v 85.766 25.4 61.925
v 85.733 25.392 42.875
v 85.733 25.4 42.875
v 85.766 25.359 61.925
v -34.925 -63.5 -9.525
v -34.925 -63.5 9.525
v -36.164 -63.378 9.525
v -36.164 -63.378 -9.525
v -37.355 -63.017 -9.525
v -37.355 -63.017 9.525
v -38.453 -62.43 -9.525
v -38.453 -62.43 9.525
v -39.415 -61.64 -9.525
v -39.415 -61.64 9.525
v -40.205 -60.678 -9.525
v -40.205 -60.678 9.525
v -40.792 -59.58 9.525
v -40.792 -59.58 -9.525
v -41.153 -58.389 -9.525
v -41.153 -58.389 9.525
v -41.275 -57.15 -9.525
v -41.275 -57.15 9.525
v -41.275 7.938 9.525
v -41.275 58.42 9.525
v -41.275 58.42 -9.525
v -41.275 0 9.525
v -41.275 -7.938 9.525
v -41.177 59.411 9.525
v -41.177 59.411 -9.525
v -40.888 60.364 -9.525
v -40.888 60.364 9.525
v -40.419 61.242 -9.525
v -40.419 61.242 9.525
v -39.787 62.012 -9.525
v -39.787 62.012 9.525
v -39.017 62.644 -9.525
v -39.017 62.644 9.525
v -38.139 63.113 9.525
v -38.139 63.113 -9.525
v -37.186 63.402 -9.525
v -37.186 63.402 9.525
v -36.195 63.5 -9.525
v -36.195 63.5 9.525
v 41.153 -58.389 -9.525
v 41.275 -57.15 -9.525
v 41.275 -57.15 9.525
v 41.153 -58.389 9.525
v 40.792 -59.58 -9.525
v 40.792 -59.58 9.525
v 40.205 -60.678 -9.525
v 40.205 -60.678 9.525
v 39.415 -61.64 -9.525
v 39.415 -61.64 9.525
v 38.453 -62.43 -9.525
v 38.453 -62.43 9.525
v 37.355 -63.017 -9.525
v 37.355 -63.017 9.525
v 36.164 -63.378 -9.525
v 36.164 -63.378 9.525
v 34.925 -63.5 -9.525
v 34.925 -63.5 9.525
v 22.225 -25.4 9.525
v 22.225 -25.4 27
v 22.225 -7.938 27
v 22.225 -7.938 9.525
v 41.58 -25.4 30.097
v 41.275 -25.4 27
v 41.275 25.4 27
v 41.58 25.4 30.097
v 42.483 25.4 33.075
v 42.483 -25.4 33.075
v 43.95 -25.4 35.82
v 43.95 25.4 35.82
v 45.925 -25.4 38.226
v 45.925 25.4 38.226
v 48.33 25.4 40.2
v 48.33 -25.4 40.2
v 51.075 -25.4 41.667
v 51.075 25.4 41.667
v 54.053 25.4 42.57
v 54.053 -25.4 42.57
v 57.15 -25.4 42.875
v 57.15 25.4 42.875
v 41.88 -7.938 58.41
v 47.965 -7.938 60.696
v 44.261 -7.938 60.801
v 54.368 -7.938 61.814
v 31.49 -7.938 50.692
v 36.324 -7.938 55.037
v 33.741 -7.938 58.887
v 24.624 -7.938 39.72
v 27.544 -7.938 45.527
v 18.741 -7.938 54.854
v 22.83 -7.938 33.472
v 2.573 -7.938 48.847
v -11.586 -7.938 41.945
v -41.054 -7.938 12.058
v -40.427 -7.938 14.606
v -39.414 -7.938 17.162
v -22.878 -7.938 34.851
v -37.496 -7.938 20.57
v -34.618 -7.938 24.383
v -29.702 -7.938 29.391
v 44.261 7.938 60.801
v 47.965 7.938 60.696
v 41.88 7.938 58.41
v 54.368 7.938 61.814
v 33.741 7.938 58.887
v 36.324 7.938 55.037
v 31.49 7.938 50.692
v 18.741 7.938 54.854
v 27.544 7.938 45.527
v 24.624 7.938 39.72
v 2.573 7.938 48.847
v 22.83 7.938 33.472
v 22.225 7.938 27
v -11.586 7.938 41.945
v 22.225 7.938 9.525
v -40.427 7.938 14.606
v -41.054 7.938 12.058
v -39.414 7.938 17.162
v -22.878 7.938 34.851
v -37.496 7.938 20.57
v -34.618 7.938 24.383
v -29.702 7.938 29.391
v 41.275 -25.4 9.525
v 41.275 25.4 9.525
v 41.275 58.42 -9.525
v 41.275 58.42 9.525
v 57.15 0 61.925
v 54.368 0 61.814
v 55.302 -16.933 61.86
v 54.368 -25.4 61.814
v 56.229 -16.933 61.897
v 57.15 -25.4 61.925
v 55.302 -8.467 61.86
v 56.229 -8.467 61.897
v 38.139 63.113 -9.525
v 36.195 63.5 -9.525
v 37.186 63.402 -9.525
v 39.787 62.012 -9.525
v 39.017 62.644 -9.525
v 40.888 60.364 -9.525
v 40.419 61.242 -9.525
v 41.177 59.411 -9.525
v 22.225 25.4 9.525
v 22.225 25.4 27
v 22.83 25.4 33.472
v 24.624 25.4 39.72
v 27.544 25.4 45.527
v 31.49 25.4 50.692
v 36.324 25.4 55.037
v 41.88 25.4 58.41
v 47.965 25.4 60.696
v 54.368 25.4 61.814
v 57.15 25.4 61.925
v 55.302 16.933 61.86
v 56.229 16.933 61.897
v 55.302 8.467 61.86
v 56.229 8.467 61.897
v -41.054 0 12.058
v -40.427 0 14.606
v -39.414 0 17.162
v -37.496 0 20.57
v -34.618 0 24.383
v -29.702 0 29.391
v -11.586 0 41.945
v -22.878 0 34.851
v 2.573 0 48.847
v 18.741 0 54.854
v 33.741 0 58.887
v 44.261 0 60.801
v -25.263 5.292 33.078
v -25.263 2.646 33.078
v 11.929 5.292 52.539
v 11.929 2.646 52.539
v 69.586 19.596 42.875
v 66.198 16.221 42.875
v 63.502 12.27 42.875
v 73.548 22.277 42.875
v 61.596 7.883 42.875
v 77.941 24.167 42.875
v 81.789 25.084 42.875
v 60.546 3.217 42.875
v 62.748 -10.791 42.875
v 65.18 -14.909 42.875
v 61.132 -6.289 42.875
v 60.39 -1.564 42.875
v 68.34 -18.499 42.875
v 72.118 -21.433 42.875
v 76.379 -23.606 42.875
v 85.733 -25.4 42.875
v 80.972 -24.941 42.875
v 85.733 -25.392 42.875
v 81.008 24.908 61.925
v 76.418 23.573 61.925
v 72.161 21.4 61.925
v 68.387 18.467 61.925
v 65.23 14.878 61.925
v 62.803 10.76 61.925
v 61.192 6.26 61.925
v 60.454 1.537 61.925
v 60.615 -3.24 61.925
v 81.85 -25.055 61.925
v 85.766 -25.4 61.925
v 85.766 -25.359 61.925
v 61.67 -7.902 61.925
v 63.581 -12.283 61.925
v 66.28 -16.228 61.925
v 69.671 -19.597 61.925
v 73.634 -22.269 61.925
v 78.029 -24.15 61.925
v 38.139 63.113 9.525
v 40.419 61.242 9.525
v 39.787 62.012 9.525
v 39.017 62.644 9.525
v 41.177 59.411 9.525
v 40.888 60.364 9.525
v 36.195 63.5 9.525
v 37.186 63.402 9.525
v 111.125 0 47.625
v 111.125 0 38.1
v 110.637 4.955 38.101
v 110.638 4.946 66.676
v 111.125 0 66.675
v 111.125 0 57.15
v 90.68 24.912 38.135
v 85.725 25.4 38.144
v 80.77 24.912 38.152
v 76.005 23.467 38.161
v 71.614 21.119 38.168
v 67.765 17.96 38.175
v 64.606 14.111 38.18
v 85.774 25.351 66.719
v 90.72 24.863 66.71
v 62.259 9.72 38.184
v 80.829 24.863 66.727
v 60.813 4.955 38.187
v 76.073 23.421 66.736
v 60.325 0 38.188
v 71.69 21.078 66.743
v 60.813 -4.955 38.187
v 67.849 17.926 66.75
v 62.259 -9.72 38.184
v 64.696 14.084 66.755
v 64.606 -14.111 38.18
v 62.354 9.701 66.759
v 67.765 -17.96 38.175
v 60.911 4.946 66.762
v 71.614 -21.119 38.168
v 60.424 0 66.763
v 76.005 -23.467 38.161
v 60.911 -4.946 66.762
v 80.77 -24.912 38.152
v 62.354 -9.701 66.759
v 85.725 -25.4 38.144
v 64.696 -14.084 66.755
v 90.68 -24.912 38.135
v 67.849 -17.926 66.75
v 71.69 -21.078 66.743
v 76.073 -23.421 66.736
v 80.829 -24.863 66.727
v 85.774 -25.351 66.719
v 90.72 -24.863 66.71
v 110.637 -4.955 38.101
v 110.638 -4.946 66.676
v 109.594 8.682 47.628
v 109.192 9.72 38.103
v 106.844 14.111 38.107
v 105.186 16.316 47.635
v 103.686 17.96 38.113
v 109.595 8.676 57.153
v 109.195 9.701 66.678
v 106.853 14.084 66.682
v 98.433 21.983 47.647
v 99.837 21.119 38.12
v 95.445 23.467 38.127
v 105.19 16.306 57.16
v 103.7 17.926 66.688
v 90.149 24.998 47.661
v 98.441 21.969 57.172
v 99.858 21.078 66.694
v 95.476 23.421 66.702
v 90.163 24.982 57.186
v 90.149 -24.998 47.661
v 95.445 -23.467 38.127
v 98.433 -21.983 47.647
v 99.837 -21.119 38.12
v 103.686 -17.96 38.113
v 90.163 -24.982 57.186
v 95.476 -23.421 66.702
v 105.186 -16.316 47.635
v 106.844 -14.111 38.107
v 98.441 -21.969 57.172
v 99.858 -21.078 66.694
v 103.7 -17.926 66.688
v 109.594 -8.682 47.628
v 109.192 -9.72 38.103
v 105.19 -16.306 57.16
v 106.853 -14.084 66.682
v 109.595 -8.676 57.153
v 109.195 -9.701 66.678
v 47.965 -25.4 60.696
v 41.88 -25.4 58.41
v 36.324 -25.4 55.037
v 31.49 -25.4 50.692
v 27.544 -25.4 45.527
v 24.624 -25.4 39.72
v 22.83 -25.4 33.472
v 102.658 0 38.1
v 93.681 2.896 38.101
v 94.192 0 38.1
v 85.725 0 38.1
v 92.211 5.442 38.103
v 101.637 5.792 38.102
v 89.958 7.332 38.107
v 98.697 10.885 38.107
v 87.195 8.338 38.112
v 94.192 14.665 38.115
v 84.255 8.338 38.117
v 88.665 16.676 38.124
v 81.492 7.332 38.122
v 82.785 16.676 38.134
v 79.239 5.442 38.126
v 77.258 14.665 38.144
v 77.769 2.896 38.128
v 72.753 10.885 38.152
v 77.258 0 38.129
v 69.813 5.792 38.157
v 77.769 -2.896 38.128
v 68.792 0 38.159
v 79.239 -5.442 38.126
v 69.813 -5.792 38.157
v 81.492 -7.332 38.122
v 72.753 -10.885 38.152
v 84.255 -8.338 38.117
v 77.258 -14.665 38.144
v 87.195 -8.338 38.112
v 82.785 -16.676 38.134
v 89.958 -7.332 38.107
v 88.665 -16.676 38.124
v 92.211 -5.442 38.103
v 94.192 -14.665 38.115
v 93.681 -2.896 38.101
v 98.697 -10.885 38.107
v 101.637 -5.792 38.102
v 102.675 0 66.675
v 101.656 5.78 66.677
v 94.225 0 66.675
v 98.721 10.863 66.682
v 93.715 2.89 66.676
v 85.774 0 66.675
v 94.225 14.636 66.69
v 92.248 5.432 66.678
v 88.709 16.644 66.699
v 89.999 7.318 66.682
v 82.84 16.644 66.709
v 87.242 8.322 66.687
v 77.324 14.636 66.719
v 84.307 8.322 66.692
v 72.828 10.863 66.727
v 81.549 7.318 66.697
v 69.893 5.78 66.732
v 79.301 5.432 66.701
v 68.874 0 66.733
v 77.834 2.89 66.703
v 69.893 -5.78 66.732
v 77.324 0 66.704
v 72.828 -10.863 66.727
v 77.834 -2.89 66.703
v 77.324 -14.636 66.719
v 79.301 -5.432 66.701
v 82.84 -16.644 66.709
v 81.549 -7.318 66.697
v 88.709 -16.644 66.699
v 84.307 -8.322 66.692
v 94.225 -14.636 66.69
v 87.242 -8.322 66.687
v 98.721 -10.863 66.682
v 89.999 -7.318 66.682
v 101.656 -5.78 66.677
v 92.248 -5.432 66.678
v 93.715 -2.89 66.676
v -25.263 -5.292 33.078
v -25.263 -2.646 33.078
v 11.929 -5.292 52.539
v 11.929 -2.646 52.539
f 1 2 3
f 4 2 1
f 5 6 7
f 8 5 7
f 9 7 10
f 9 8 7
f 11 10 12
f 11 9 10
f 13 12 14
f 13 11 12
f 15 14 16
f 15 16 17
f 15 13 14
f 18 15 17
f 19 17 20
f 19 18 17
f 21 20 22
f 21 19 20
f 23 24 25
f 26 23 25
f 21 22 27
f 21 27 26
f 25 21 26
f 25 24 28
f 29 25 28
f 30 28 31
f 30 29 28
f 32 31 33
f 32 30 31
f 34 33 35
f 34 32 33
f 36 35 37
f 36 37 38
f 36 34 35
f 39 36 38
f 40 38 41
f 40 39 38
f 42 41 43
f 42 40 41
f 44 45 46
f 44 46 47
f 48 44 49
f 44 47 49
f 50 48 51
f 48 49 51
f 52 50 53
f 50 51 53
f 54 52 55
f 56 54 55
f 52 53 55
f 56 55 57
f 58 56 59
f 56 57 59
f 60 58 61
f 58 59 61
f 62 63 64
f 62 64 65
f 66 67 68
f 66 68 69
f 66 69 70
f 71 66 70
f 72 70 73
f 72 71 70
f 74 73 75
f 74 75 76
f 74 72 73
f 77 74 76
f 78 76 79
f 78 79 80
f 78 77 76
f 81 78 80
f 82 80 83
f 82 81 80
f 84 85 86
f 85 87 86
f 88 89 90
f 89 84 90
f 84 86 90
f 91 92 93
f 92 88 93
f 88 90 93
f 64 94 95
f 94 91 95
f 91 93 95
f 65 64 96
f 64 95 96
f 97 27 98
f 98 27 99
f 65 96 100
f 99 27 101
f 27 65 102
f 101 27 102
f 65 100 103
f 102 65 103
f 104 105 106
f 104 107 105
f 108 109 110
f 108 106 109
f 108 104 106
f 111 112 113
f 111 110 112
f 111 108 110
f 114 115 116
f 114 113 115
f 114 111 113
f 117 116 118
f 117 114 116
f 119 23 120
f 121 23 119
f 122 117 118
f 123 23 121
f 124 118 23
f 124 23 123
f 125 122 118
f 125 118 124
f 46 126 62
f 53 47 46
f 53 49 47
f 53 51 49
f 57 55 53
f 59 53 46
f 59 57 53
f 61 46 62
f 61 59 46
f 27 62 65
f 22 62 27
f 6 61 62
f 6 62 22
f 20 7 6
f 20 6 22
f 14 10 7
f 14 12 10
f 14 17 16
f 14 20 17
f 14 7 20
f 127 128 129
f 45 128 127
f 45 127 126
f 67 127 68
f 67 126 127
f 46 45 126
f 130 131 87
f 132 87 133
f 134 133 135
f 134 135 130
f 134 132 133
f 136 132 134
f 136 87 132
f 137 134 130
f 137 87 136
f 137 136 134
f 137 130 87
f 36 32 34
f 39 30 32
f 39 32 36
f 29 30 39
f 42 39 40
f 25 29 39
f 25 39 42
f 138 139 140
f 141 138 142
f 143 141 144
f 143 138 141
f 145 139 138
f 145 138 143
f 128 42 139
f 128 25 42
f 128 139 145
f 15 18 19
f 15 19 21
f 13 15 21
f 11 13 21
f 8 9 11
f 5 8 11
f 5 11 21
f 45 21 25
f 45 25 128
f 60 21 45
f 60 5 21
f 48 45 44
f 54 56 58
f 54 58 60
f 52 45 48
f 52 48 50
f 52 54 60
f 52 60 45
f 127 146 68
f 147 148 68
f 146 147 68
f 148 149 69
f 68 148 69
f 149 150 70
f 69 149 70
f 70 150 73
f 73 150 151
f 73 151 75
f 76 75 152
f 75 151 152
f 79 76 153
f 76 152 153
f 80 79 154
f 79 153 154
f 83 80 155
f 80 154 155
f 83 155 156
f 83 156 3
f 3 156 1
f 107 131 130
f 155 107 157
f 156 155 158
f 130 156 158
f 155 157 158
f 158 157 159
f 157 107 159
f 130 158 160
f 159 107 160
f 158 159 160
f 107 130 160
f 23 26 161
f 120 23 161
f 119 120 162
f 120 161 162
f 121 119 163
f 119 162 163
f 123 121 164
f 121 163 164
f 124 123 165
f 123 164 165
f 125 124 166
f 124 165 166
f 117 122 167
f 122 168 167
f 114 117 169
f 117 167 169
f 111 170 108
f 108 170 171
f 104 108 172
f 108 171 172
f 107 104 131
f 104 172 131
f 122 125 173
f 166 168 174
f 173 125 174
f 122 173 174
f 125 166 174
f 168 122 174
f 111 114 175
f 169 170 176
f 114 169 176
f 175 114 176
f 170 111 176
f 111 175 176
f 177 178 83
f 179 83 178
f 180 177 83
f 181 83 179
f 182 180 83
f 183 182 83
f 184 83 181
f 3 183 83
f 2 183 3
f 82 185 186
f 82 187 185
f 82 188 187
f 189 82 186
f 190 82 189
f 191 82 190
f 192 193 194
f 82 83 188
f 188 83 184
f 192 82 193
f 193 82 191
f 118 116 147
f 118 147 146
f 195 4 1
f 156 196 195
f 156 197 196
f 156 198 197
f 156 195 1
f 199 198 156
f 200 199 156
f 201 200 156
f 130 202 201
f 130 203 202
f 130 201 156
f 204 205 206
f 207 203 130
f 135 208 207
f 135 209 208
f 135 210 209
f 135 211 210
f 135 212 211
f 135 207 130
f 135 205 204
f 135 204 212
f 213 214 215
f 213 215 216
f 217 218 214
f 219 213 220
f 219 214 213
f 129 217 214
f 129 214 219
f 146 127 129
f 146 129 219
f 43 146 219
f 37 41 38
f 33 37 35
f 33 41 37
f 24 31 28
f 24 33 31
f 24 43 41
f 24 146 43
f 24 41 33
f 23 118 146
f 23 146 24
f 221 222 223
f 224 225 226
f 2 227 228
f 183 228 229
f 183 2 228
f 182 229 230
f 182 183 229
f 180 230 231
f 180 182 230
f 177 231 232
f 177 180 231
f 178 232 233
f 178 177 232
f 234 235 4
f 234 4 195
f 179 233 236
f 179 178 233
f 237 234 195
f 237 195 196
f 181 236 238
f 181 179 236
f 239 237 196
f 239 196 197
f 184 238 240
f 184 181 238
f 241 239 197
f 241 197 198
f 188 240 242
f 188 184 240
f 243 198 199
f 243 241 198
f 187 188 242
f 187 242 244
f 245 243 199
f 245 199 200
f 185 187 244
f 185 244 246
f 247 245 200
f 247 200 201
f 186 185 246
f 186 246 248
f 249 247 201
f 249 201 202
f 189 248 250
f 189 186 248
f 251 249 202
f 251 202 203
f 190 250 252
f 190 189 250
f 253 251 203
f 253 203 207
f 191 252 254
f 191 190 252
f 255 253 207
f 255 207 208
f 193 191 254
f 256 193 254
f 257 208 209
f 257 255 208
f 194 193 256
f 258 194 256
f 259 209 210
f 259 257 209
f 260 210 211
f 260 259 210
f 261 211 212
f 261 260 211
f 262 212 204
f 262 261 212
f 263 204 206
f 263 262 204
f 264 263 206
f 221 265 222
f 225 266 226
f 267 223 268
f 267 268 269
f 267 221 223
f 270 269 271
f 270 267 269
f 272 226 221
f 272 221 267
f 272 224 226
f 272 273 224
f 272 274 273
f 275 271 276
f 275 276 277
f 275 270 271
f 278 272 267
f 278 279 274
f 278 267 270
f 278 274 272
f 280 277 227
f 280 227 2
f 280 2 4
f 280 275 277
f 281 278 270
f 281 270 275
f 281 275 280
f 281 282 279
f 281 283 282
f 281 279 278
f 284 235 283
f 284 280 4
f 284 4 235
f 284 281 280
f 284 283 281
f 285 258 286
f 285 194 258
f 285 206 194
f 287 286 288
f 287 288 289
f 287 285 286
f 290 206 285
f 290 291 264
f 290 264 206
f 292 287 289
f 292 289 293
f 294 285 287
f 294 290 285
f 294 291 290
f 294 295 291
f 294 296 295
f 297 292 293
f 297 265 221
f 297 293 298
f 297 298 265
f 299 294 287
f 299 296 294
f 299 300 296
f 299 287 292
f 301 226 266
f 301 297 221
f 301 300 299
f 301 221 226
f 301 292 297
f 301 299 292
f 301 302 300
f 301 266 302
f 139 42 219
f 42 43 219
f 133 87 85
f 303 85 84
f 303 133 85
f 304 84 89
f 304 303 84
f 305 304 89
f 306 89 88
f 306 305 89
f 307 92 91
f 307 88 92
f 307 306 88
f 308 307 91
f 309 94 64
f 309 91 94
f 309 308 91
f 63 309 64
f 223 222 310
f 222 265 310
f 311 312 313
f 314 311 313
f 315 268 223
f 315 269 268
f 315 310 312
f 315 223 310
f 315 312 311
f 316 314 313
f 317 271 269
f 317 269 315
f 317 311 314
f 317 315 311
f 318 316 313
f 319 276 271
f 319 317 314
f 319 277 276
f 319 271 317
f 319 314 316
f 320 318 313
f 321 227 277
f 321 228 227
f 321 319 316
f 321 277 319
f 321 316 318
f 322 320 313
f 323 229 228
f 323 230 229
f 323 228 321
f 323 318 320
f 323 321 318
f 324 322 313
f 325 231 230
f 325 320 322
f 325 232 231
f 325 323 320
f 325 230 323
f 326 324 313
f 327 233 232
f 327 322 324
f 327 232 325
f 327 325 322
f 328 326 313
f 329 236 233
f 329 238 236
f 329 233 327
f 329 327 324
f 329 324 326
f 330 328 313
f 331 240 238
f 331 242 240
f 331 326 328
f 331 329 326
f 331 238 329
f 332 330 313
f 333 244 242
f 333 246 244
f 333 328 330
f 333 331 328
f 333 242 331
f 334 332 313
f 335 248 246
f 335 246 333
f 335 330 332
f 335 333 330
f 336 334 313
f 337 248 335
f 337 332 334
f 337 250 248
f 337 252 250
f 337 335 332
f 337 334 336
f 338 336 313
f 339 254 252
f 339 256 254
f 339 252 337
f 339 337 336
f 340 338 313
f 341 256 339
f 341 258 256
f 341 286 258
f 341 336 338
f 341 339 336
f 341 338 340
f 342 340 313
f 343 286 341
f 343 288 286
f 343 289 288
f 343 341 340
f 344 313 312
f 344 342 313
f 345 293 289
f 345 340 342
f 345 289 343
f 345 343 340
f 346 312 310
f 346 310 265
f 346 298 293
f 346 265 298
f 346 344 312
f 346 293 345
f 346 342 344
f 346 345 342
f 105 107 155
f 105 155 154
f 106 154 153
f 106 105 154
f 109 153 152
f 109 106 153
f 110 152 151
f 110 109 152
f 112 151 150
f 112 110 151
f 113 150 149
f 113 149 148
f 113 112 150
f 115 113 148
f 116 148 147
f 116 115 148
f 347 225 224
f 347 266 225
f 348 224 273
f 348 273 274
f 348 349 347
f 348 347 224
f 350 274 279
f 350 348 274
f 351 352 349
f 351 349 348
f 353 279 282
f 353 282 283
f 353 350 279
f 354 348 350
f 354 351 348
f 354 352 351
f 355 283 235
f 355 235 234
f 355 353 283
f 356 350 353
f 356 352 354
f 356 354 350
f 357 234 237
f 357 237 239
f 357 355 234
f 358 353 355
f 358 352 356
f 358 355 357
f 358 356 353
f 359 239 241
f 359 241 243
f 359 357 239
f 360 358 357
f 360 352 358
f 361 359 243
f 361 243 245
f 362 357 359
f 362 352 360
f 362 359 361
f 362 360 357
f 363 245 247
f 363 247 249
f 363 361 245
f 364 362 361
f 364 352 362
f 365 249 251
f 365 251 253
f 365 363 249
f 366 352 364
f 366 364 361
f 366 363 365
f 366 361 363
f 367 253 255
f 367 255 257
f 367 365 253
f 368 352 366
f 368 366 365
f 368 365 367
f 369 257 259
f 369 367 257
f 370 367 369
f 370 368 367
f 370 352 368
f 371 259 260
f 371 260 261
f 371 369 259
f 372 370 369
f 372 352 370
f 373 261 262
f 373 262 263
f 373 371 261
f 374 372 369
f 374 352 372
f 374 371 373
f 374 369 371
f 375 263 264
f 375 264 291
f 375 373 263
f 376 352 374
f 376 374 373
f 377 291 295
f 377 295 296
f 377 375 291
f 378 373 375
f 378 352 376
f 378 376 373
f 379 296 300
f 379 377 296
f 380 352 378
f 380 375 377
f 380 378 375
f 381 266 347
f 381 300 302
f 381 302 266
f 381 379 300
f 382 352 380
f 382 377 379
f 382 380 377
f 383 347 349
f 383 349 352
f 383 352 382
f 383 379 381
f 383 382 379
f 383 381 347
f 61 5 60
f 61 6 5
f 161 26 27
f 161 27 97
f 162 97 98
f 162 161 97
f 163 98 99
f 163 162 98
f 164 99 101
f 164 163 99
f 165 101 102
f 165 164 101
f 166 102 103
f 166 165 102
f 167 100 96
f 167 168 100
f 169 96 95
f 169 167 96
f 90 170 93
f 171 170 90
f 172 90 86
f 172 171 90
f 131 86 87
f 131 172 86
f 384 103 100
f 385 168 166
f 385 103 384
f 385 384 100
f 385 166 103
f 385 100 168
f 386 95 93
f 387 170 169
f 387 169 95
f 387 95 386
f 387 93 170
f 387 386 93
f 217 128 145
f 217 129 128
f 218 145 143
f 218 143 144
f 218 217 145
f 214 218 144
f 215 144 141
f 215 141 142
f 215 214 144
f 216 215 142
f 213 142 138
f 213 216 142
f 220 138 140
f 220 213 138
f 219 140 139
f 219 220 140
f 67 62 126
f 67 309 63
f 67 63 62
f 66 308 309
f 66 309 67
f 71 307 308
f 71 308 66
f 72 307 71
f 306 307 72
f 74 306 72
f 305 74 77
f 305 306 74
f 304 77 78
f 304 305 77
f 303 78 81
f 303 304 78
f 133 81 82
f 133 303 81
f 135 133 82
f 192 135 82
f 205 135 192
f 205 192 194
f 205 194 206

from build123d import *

# Parameters (mm, degrees)
F1_DEPTH = 63.5
F2_DEPTH = 7.9375
F3_DEPTH = 25.4
F5_R     = 6.35
F6_R     = 5.08


with BuildPart() as f1:
    # F0 (on Front) → F1 (new body, symmetric)
    with BuildSketch(Plane.XZ):
        Polygon((-41.275, -9.525), (41.275, -9.525), (41.275, 9.525), (22.225, 9.525), (-41.275, 9.525), align=None)
    extrude(amount=F1_DEPTH, both=True)

    # F0 (on Front) → F2 (join, symmetric)
    with BuildSketch(Plane.XZ):
        with BuildLine():
            add(Edge.make_bspline(
                [(-41.275, 9.525), (-41.1638136776, 33.0921679971), (14.6157059848, 59.6638127103), (54.3682484127, 61.8142414647)],
                knots=[0, 0, 0, 0, 108.9382602659, 108.9382602659, 108.9382602659, 108.9382602659], degree=3))
            Line((-41.275, 9.525), (22.225, 9.525))
            Line((22.225, 9.525), (22.225, 27.0002))
            ThreePointArc((22.225, 27.0002), (31.489638553, 50.6920018607), (54.3682484127, 61.8142414647))
        make_face()
    extrude(amount=F2_DEPTH, both=True)

    # F0 (on Front) → F3 (join, symmetric)
    with BuildSketch(Plane.XZ):
        with BuildLine():
            Line((22.225, 9.525), (41.275, 9.525))
            Line((41.275, 9.525), (41.275, 27.0002))
            ThreePointArc((41.275, 27.0002), (45.9246798487, 38.2255201513), (57.15, 42.8752))
            Line((57.15, 42.8752), (60.325, 42.8752))
            Line((60.325, 42.8752), (60.325, 61.9252))
            Line((60.325, 61.9252), (57.15, 61.9252))
            add(Edge.make_bspline(
                [(54.3682484127, 61.8142414647), (55.3047053678, 61.8648994564), (56.2322683165, 61.902005145), (57.15, 61.9252)],
                knots=[108.9382602659, 108.9382602659, 108.9382602659, 108.9382602659, 111.5045361635, 111.5045361635, 111.5045361635, 111.5045361635], degree=3))
            ThreePointArc((54.3682484127, 61.8142414647), (31.489638553, 50.6920018607), (22.225, 27.0002))
            Line((22.225, 27.0002), (22.225, 9.525))
        make_face()
        Polygon((60.325, 61.9252), (60.325, 42.8752), (85.7332489532, 42.8752), (85.7661570114, 61.9252), align=None)
    extrude(amount=F3_DEPTH, both=True)

    # F0 (on Front) → F4 (revolve)
    with BuildSketch(Plane.XZ):
        Polygon((85.7661570114, 61.9252), (85.7332489532, 42.8752), (85.725, 38.1), (111.125, 38.1), (111.125, 66.675), (85.7743620872, 66.675), align=None)
    revolve(axis=Axis((85.7496810436, 0, 52.3875), (0.0017274545, 0, 0.9999985079)))

    # F5
    f5_edges = [f1.edges().sort_by_distance(p)[0] for p in [
        (41.275, -63.5, 0),
        (-41.275, -63.5, 0),
    ]]
    fillet(f5_edges, radius=F5_R)

    # F6
    f6_edges = [f1.edges().sort_by_distance(p)[0] for p in [
        (-41.275, 63.5, 0),
        (41.275, 63.5, 0),
    ]]
    fillet(f6_edges, radius=F6_R)


solid = f1.part
